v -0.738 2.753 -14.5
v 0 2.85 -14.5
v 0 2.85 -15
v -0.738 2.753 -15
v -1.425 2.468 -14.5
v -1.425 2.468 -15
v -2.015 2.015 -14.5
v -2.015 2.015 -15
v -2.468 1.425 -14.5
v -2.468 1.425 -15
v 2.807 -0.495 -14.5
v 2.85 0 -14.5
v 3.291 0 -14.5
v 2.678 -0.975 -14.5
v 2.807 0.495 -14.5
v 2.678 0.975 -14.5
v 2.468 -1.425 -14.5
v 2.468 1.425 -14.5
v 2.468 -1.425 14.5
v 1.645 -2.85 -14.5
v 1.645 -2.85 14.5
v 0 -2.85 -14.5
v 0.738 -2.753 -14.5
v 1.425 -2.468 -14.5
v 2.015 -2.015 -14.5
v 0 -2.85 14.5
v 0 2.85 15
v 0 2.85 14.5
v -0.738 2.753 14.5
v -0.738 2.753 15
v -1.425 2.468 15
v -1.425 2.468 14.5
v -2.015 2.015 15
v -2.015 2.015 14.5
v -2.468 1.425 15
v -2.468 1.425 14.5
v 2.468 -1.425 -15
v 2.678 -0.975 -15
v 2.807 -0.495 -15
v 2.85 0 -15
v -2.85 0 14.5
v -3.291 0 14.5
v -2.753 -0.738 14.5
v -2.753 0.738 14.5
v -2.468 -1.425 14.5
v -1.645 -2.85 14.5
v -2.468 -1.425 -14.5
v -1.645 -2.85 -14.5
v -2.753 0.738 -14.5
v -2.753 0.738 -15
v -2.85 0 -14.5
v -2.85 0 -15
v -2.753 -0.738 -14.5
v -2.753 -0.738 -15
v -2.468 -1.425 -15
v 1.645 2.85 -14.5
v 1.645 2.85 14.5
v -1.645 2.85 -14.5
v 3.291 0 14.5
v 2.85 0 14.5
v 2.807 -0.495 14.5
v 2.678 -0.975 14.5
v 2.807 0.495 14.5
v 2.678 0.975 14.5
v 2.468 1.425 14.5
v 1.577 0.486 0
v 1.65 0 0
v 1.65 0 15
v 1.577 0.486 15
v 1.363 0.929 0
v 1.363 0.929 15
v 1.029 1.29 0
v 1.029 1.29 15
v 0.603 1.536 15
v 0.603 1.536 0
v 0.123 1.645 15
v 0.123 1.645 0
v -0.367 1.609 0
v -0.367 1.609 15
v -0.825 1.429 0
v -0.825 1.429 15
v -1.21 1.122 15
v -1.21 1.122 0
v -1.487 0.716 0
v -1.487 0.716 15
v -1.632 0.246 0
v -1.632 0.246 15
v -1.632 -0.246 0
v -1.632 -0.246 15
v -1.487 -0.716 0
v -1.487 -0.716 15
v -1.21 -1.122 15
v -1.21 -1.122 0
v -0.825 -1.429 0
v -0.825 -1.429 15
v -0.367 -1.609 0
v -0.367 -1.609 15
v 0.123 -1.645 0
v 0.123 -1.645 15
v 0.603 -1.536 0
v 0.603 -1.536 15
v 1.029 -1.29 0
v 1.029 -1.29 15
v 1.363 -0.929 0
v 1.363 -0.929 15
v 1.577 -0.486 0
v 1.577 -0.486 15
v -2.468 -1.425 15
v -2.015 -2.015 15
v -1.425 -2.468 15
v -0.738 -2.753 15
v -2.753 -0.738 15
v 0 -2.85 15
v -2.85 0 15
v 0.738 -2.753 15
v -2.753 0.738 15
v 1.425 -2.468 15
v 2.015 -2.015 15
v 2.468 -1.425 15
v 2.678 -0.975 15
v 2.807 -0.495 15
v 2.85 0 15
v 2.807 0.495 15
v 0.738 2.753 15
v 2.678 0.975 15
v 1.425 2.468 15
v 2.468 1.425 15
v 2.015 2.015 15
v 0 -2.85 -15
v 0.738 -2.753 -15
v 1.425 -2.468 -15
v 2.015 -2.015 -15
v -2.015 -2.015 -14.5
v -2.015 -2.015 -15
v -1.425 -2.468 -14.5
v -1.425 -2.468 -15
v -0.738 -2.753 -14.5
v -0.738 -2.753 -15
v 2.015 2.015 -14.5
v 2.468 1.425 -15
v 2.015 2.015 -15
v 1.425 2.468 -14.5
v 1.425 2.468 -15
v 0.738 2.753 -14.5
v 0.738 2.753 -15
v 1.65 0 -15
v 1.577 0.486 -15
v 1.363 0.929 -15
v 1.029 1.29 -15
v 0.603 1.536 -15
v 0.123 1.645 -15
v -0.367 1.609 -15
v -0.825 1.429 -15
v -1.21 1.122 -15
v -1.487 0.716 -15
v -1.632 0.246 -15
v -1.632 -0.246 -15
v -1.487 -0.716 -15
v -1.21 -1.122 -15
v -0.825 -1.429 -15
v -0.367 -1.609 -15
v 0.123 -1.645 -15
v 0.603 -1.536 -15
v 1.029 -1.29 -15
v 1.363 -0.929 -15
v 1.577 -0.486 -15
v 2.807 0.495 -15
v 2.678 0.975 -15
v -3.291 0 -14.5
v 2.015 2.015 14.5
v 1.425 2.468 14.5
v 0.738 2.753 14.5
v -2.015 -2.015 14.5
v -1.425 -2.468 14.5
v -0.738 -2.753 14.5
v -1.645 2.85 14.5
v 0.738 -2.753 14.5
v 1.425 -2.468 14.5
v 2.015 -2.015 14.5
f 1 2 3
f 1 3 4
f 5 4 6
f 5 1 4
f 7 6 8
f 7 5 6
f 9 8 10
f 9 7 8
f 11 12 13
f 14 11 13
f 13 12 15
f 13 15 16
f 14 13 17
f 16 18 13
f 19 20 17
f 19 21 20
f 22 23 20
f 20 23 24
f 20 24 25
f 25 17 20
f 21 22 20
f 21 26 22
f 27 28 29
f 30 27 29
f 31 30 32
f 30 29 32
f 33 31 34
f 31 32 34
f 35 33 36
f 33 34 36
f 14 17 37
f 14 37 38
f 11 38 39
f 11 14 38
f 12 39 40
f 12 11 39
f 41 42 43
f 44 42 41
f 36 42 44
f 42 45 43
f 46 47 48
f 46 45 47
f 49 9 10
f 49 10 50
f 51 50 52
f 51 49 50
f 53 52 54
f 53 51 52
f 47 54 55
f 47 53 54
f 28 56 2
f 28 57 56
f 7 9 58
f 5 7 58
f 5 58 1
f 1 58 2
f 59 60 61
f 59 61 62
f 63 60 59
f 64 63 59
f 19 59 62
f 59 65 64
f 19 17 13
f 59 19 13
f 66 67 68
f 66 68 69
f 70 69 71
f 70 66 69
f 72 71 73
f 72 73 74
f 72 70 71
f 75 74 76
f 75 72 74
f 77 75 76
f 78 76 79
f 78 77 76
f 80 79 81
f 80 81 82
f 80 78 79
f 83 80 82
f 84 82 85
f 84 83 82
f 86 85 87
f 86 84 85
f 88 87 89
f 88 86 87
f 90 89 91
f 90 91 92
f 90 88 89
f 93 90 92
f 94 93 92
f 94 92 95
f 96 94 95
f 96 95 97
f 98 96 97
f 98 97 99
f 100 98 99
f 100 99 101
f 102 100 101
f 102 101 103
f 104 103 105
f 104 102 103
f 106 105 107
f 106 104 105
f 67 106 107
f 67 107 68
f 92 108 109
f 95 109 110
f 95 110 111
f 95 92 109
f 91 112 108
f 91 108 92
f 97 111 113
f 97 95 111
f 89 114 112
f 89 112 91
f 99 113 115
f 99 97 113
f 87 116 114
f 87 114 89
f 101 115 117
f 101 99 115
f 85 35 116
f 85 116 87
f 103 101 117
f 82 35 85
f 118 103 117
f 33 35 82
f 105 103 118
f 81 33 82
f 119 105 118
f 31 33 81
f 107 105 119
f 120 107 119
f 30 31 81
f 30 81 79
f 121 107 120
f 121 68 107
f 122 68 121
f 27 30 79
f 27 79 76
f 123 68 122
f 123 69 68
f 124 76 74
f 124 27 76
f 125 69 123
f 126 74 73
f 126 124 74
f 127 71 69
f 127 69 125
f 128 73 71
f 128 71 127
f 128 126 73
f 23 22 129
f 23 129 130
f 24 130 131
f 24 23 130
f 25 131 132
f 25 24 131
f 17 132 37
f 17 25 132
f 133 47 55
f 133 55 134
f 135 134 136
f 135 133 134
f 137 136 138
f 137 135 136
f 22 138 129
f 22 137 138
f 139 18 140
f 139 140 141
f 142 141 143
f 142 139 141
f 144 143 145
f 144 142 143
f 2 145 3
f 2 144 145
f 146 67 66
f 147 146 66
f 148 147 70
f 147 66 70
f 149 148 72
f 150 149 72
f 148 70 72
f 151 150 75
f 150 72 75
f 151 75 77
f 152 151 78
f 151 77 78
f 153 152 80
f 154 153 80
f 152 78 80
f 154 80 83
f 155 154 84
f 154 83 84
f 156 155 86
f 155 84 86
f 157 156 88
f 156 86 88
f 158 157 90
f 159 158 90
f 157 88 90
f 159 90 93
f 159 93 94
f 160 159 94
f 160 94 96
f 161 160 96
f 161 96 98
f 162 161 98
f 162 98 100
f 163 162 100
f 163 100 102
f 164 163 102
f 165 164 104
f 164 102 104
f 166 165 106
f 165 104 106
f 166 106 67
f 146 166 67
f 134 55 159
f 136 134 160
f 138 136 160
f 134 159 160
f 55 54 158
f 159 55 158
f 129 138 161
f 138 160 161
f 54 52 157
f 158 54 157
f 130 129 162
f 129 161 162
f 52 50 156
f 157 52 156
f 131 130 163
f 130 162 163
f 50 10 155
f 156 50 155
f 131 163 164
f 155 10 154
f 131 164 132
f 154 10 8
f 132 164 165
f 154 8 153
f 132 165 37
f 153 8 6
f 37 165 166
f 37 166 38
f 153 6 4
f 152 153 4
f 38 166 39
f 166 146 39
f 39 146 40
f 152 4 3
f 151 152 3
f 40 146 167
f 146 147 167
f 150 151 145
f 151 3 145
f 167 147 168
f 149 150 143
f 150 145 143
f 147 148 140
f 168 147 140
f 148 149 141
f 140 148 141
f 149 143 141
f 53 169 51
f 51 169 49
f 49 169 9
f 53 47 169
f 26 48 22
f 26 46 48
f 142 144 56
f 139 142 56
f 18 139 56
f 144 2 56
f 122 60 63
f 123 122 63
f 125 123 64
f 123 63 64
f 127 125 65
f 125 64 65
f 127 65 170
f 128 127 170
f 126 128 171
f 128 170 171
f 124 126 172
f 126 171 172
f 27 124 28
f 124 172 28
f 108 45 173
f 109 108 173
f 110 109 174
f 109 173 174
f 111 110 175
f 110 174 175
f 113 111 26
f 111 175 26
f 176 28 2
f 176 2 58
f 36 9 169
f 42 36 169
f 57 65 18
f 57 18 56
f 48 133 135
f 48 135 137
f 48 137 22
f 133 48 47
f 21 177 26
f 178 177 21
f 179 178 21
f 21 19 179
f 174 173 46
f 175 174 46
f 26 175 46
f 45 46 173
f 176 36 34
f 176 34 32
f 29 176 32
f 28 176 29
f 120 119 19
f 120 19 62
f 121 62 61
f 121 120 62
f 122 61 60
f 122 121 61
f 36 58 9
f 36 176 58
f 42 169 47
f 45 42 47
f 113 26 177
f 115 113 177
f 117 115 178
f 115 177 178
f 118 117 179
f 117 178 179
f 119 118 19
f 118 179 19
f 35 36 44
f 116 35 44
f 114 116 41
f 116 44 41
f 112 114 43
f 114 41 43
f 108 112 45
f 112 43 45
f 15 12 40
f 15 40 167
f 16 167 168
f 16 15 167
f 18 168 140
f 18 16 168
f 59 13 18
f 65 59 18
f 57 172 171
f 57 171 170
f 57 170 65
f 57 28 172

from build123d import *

# Parameters (mm, degrees)
F2_DEPTH = 14.5
F0_R     = 1.65
F3_DEPTH = 15


# Not quite as in the source:
# - the program builds the solid bodies; features that only make, move or delete a surface that nothing else refers to are left out


with BuildPart() as f2:
    # F0 (on Top) → F2 (new body, symmetric)
    with BuildSketch(Plane.XY):
        with BuildLine():
            ThreePointArc((-2.4681723606, -1.4250000696), (-2.85, -3.73e-08), (-2.4681723979, 1.425000005))
            Line((-2.4681723979, 1.425000005), (-3.2908965344, 0))
            Line((-3.2908965344, 0), (-2.4681723606, -1.4250000696))
        make_face()
    extrude(amount=F2_DEPTH, both=True)



with BuildPart() as f2b:
    # F0 (on Top) → F2, piece 2 (new body, symmetric)
    with BuildSketch(Plane.XY):
        with BuildLine():
            ThreePointArc((-2.4681723979, 1.425000005), (-1.4249999975, 2.4681724022), (0, 2.85))
            Line((0, 2.85), (-1.6454482672, 2.85))
            Line((-1.6454482672, 2.85), (-2.4681723979, 1.425000005))
        make_face()
    extrude(amount=F2_DEPTH, both=True)


with BuildPart() as f2c:
    # F0 (on Top) → F2, piece 3 (new body, symmetric)
    with BuildSketch(Plane.XY):
        with BuildLine():
            ThreePointArc((0, 2.85), (1.4249999814, 2.4681724115), (2.4681723793, 1.4250000373))
            Line((2.4681723793, 1.4250000373), (1.6454482672, 2.85))
            Line((1.6454482672, 2.85), (0, 2.85))
        make_face()
    extrude(amount=F2_DEPTH, both=True)


with BuildPart() as f2d:
    # F0 (on Top) → F2, piece 4 (new body, symmetric)
    with BuildSketch(Plane.XY):
        with BuildLine():
            ThreePointArc((2.4681723793, 1.4250000373), (2.7528885994, 0.7376342993), (2.85, 0))
            ThreePointArc((2.85, 0), (2.7528886042, -0.7376342813), (2.4681723979, -1.425000005))
            Line((2.4681723979, -1.425000005), (3.2908965344, 0))
            Line((3.2908965344, 0), (2.4681723793, 1.4250000373))
        make_face()
    extrude(amount=F2_DEPTH, both=True)


with BuildPart() as f2e:
    # F0 (on Top) → F2, piece 5 (new body, symmetric)
    with BuildSketch(Plane.XY):
        with BuildLine():
            Line((1.6454482672, -2.85), (2.4681723979, -1.425000005))
            ThreePointArc((2.4681723979, -1.425000005), (1.4249999975, -2.4681724022), (0, -2.85))
            Line((0, -2.85), (1.6454482672, -2.85))
        make_face()
    extrude(amount=F2_DEPTH, both=True)


with BuildPart() as f2f:
    # F0 (on Top) → F2, piece 6 (new body, symmetric)
    with BuildSketch(Plane.XY):
        with BuildLine():
            Line((-1.6454482672, -2.85), (0, -2.85))
            ThreePointArc((0, -2.85), (-1.4249999652, -2.4681724209), (-2.4681723606, -1.4250000696))
            Line((-2.4681723606, -1.4250000696), (-1.6454482672, -2.85))
        make_face()
    extrude(amount=F2_DEPTH, both=True)


with BuildPart() as f2_1:
    add(f2.part)

    add(f2b.part)  # F3 merges F2b

    add(f2c.part)  # F3 merges F2c

    add(f2d.part)  # F3 merges F2d

    add(f2e.part)  # F3 merges F2e

    add(f2f.part)  # F3 merges F2f
    # F0 (on Top) → F3 (join, symmetric)
    with BuildSketch(Plane.XY):
        with BuildLine():
            ThreePointArc((2.4681723979, -1.425000005), (2.7528886042, -0.7376342813), (2.85, 0))
            ThreePointArc((2.85, 0), (2.7528885994, 0.7376342993), (2.4681723793, 1.4250000373))
            ThreePointArc((2.4681723793, 1.4250000373), (1.4249999814, 2.4681724115), (0, 2.85))
            ThreePointArc((0, 2.85), (-1.4249999975, 2.4681724022), (-2.4681723979, 1.425000005))
            ThreePointArc((-2.4681723979, 1.425000005), (-2.85, -3.73e-08), (-2.4681723606, -1.4250000696))
            ThreePointArc((-2.4681723606, -1.4250000696), (-1.4249999652, -2.4681724209), (0, -2.85))
            ThreePointArc((0, -2.85), (1.4249999975, -2.4681724022), (2.4681723979, -1.425000005))
        make_face()
        Circle(F0_R, mode=Mode.SUBTRACT)
    extrude(amount=F3_DEPTH, both=True)


solid = f2_1.part
